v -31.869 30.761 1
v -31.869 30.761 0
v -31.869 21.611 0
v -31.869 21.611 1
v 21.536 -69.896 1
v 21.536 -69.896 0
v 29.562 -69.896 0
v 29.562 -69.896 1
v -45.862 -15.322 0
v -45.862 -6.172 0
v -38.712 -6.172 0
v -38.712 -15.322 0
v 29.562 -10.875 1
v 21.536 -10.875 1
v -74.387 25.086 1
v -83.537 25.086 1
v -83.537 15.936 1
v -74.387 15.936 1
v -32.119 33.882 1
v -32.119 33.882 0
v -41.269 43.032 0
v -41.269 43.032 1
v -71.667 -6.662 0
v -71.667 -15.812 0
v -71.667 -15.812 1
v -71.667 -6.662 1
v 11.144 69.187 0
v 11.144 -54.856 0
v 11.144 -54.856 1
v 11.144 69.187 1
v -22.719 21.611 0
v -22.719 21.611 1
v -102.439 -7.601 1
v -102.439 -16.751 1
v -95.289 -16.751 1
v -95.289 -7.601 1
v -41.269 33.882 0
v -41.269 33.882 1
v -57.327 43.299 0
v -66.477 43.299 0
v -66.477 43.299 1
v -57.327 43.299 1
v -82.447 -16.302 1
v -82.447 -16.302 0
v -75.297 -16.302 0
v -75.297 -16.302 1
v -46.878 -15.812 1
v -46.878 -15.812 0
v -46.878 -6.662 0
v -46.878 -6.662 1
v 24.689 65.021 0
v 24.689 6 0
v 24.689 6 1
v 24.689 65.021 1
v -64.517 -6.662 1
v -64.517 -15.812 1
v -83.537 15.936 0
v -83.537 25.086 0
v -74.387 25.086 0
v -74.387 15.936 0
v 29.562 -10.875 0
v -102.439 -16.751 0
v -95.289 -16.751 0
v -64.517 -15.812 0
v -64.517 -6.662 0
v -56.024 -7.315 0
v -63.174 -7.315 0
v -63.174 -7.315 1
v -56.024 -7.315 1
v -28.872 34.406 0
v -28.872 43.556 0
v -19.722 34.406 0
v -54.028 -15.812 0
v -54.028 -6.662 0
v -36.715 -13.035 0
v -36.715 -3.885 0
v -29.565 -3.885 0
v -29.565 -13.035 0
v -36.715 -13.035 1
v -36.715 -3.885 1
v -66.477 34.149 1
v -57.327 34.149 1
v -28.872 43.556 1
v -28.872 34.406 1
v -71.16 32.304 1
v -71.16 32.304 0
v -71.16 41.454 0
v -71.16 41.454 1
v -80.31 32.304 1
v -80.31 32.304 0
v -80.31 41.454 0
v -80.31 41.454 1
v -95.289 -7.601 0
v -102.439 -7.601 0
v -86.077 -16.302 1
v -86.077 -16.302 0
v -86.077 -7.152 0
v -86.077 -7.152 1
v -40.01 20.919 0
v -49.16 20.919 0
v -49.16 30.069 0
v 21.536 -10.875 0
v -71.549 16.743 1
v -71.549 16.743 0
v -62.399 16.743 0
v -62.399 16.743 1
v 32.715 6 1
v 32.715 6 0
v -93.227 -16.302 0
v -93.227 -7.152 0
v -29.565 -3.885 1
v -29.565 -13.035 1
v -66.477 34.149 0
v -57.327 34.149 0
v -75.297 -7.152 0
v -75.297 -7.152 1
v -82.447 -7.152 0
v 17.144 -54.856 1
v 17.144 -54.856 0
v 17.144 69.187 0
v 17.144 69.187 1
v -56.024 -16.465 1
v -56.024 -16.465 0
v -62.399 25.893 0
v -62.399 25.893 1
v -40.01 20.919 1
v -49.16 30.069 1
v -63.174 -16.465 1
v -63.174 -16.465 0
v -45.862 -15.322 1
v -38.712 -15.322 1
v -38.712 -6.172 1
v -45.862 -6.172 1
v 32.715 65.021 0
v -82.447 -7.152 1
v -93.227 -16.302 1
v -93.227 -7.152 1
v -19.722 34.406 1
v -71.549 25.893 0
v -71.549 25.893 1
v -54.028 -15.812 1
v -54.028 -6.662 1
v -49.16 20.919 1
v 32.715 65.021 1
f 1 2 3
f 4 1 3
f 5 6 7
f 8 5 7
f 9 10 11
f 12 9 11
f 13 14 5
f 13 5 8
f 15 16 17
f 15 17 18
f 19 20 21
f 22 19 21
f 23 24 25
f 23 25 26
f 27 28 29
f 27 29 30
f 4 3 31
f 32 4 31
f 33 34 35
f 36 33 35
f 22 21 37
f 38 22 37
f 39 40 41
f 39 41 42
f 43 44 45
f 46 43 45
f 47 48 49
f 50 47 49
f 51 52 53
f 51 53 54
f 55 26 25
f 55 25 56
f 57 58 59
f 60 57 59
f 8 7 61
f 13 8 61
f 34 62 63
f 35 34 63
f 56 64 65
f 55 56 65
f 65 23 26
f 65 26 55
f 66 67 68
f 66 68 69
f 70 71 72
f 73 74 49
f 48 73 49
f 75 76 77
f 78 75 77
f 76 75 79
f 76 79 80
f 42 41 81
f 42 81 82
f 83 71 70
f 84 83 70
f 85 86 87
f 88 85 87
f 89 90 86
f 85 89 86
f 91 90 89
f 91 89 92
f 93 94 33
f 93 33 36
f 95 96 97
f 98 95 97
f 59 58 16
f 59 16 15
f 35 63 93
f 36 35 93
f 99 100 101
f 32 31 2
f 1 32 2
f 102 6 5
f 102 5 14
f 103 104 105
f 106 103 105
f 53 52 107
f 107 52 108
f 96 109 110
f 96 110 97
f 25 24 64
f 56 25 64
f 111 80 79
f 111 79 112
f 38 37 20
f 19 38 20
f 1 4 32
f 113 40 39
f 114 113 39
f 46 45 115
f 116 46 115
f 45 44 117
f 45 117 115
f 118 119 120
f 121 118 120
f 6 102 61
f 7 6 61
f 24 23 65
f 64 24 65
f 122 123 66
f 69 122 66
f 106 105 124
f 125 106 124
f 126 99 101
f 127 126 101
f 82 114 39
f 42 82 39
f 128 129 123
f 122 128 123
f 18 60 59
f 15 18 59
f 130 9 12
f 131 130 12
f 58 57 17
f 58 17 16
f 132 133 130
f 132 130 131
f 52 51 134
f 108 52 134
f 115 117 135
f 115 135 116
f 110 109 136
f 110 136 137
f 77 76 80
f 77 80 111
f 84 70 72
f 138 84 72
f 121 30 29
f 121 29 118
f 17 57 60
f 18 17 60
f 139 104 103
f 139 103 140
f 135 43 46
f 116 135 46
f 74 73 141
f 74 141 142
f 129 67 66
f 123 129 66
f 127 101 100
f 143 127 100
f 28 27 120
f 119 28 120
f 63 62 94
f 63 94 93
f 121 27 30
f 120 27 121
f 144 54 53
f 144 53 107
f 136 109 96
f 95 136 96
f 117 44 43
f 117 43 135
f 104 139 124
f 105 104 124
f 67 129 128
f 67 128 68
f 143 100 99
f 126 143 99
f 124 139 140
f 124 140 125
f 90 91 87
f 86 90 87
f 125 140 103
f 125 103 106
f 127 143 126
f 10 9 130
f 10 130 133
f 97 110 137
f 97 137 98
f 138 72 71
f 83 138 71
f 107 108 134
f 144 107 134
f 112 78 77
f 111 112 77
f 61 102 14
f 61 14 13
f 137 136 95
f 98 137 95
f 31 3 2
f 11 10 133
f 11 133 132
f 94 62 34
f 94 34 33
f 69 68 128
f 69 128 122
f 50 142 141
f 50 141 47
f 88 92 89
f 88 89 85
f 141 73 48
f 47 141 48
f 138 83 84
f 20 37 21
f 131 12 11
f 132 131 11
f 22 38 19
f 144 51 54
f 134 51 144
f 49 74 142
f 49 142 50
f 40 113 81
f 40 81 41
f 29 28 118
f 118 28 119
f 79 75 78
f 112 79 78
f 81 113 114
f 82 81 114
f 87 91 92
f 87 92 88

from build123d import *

# Parameters (mm, degrees)
F0_W     = 9.15
F0_H     = 9.15
F1_DEPTH = 1
F2_W     = 7.15
F2_H     = 9.15
F3_DEPTH = 1
F4_W     = 6
F4_H     = 124.04284
F4_W_2   = 8.025709
F4_H_2   = 59.02142
F5_DEPTH = 1


with BuildPart() as f1:
    # F0 (on Top) → F1 (new body)
    with BuildSketch(Plane.XY):
        with Locations((-75.734839, 36.879253)):
            Rectangle(F0_W, F0_H)
        with Locations((-78.96243, 20.510739)):
            Rectangle(F0_W, F0_H)
        with Locations((-61.902288, 38.723592)):
            Rectangle(F0_W, F0_H)
        with Locations((-66.974223, 21.317637)):
            Rectangle(F0_W, F0_H)
        Polygon((-40.010135, 20.918875), (-49.160135, 30.068875), (-49.160135, 20.918875), align=None)
        Polygon((-22.719449, 21.610502), (-31.869449, 30.760502), (-31.869449, 21.610502), align=None)
        Polygon((-32.11874, 33.882201), (-41.26874, 43.032201), (-41.26874, 33.882201), align=None)
        Polygon((-19.722399, 34.405607), (-28.872399, 43.555607), (-28.872399, 34.405607), align=None)
    extrude(amount=F1_DEPTH)


with BuildPart() as f3:
    # F2 (on Top) → F3 (new body)
    with BuildSketch(Plane.XY):
        with Locations((-98.86425, -12.175959)):
            Rectangle(F2_W, F2_H)
        with Locations((-89.651681, -11.726807)):
            Rectangle(F2_W, F2_H)
        with Locations((-78.872047, -11.726807)):
            Rectangle(F2_W, F2_H)
        with Locations((-68.092406, -11.236824)):
            Rectangle(F2_W, F2_H)
        with Locations((-59.599359, -11.890135)):
            Rectangle(F2_W, F2_H)
        with Locations((-50.453, -11.236824)):
            Rectangle(F2_W, F2_H)
        with Locations((-42.286608, -10.74684)):
            Rectangle(F2_W, F2_H)
        with Locations((-33.14025, -8.460251)):
            Rectangle(F2_W, F2_H)
    extrude(amount=F3_DEPTH)


with BuildPart() as f5:
    # F4 (on Top) → F5 (new body)
    with BuildSketch(Plane.XY):
        with Locations((14.14427, 7.165816)):
            Rectangle(F4_W, F4_H)
        with Locations((28.702007, 35.51071)):
            Rectangle(F4_W_2, F4_H_2)
        with Locations((25.549048, -40.385623)):
            Rectangle(F4_W_2, F4_H_2)
    extrude(amount=F5_DEPTH)


solid = Compound([f1.part, f3.part, f5.part])
